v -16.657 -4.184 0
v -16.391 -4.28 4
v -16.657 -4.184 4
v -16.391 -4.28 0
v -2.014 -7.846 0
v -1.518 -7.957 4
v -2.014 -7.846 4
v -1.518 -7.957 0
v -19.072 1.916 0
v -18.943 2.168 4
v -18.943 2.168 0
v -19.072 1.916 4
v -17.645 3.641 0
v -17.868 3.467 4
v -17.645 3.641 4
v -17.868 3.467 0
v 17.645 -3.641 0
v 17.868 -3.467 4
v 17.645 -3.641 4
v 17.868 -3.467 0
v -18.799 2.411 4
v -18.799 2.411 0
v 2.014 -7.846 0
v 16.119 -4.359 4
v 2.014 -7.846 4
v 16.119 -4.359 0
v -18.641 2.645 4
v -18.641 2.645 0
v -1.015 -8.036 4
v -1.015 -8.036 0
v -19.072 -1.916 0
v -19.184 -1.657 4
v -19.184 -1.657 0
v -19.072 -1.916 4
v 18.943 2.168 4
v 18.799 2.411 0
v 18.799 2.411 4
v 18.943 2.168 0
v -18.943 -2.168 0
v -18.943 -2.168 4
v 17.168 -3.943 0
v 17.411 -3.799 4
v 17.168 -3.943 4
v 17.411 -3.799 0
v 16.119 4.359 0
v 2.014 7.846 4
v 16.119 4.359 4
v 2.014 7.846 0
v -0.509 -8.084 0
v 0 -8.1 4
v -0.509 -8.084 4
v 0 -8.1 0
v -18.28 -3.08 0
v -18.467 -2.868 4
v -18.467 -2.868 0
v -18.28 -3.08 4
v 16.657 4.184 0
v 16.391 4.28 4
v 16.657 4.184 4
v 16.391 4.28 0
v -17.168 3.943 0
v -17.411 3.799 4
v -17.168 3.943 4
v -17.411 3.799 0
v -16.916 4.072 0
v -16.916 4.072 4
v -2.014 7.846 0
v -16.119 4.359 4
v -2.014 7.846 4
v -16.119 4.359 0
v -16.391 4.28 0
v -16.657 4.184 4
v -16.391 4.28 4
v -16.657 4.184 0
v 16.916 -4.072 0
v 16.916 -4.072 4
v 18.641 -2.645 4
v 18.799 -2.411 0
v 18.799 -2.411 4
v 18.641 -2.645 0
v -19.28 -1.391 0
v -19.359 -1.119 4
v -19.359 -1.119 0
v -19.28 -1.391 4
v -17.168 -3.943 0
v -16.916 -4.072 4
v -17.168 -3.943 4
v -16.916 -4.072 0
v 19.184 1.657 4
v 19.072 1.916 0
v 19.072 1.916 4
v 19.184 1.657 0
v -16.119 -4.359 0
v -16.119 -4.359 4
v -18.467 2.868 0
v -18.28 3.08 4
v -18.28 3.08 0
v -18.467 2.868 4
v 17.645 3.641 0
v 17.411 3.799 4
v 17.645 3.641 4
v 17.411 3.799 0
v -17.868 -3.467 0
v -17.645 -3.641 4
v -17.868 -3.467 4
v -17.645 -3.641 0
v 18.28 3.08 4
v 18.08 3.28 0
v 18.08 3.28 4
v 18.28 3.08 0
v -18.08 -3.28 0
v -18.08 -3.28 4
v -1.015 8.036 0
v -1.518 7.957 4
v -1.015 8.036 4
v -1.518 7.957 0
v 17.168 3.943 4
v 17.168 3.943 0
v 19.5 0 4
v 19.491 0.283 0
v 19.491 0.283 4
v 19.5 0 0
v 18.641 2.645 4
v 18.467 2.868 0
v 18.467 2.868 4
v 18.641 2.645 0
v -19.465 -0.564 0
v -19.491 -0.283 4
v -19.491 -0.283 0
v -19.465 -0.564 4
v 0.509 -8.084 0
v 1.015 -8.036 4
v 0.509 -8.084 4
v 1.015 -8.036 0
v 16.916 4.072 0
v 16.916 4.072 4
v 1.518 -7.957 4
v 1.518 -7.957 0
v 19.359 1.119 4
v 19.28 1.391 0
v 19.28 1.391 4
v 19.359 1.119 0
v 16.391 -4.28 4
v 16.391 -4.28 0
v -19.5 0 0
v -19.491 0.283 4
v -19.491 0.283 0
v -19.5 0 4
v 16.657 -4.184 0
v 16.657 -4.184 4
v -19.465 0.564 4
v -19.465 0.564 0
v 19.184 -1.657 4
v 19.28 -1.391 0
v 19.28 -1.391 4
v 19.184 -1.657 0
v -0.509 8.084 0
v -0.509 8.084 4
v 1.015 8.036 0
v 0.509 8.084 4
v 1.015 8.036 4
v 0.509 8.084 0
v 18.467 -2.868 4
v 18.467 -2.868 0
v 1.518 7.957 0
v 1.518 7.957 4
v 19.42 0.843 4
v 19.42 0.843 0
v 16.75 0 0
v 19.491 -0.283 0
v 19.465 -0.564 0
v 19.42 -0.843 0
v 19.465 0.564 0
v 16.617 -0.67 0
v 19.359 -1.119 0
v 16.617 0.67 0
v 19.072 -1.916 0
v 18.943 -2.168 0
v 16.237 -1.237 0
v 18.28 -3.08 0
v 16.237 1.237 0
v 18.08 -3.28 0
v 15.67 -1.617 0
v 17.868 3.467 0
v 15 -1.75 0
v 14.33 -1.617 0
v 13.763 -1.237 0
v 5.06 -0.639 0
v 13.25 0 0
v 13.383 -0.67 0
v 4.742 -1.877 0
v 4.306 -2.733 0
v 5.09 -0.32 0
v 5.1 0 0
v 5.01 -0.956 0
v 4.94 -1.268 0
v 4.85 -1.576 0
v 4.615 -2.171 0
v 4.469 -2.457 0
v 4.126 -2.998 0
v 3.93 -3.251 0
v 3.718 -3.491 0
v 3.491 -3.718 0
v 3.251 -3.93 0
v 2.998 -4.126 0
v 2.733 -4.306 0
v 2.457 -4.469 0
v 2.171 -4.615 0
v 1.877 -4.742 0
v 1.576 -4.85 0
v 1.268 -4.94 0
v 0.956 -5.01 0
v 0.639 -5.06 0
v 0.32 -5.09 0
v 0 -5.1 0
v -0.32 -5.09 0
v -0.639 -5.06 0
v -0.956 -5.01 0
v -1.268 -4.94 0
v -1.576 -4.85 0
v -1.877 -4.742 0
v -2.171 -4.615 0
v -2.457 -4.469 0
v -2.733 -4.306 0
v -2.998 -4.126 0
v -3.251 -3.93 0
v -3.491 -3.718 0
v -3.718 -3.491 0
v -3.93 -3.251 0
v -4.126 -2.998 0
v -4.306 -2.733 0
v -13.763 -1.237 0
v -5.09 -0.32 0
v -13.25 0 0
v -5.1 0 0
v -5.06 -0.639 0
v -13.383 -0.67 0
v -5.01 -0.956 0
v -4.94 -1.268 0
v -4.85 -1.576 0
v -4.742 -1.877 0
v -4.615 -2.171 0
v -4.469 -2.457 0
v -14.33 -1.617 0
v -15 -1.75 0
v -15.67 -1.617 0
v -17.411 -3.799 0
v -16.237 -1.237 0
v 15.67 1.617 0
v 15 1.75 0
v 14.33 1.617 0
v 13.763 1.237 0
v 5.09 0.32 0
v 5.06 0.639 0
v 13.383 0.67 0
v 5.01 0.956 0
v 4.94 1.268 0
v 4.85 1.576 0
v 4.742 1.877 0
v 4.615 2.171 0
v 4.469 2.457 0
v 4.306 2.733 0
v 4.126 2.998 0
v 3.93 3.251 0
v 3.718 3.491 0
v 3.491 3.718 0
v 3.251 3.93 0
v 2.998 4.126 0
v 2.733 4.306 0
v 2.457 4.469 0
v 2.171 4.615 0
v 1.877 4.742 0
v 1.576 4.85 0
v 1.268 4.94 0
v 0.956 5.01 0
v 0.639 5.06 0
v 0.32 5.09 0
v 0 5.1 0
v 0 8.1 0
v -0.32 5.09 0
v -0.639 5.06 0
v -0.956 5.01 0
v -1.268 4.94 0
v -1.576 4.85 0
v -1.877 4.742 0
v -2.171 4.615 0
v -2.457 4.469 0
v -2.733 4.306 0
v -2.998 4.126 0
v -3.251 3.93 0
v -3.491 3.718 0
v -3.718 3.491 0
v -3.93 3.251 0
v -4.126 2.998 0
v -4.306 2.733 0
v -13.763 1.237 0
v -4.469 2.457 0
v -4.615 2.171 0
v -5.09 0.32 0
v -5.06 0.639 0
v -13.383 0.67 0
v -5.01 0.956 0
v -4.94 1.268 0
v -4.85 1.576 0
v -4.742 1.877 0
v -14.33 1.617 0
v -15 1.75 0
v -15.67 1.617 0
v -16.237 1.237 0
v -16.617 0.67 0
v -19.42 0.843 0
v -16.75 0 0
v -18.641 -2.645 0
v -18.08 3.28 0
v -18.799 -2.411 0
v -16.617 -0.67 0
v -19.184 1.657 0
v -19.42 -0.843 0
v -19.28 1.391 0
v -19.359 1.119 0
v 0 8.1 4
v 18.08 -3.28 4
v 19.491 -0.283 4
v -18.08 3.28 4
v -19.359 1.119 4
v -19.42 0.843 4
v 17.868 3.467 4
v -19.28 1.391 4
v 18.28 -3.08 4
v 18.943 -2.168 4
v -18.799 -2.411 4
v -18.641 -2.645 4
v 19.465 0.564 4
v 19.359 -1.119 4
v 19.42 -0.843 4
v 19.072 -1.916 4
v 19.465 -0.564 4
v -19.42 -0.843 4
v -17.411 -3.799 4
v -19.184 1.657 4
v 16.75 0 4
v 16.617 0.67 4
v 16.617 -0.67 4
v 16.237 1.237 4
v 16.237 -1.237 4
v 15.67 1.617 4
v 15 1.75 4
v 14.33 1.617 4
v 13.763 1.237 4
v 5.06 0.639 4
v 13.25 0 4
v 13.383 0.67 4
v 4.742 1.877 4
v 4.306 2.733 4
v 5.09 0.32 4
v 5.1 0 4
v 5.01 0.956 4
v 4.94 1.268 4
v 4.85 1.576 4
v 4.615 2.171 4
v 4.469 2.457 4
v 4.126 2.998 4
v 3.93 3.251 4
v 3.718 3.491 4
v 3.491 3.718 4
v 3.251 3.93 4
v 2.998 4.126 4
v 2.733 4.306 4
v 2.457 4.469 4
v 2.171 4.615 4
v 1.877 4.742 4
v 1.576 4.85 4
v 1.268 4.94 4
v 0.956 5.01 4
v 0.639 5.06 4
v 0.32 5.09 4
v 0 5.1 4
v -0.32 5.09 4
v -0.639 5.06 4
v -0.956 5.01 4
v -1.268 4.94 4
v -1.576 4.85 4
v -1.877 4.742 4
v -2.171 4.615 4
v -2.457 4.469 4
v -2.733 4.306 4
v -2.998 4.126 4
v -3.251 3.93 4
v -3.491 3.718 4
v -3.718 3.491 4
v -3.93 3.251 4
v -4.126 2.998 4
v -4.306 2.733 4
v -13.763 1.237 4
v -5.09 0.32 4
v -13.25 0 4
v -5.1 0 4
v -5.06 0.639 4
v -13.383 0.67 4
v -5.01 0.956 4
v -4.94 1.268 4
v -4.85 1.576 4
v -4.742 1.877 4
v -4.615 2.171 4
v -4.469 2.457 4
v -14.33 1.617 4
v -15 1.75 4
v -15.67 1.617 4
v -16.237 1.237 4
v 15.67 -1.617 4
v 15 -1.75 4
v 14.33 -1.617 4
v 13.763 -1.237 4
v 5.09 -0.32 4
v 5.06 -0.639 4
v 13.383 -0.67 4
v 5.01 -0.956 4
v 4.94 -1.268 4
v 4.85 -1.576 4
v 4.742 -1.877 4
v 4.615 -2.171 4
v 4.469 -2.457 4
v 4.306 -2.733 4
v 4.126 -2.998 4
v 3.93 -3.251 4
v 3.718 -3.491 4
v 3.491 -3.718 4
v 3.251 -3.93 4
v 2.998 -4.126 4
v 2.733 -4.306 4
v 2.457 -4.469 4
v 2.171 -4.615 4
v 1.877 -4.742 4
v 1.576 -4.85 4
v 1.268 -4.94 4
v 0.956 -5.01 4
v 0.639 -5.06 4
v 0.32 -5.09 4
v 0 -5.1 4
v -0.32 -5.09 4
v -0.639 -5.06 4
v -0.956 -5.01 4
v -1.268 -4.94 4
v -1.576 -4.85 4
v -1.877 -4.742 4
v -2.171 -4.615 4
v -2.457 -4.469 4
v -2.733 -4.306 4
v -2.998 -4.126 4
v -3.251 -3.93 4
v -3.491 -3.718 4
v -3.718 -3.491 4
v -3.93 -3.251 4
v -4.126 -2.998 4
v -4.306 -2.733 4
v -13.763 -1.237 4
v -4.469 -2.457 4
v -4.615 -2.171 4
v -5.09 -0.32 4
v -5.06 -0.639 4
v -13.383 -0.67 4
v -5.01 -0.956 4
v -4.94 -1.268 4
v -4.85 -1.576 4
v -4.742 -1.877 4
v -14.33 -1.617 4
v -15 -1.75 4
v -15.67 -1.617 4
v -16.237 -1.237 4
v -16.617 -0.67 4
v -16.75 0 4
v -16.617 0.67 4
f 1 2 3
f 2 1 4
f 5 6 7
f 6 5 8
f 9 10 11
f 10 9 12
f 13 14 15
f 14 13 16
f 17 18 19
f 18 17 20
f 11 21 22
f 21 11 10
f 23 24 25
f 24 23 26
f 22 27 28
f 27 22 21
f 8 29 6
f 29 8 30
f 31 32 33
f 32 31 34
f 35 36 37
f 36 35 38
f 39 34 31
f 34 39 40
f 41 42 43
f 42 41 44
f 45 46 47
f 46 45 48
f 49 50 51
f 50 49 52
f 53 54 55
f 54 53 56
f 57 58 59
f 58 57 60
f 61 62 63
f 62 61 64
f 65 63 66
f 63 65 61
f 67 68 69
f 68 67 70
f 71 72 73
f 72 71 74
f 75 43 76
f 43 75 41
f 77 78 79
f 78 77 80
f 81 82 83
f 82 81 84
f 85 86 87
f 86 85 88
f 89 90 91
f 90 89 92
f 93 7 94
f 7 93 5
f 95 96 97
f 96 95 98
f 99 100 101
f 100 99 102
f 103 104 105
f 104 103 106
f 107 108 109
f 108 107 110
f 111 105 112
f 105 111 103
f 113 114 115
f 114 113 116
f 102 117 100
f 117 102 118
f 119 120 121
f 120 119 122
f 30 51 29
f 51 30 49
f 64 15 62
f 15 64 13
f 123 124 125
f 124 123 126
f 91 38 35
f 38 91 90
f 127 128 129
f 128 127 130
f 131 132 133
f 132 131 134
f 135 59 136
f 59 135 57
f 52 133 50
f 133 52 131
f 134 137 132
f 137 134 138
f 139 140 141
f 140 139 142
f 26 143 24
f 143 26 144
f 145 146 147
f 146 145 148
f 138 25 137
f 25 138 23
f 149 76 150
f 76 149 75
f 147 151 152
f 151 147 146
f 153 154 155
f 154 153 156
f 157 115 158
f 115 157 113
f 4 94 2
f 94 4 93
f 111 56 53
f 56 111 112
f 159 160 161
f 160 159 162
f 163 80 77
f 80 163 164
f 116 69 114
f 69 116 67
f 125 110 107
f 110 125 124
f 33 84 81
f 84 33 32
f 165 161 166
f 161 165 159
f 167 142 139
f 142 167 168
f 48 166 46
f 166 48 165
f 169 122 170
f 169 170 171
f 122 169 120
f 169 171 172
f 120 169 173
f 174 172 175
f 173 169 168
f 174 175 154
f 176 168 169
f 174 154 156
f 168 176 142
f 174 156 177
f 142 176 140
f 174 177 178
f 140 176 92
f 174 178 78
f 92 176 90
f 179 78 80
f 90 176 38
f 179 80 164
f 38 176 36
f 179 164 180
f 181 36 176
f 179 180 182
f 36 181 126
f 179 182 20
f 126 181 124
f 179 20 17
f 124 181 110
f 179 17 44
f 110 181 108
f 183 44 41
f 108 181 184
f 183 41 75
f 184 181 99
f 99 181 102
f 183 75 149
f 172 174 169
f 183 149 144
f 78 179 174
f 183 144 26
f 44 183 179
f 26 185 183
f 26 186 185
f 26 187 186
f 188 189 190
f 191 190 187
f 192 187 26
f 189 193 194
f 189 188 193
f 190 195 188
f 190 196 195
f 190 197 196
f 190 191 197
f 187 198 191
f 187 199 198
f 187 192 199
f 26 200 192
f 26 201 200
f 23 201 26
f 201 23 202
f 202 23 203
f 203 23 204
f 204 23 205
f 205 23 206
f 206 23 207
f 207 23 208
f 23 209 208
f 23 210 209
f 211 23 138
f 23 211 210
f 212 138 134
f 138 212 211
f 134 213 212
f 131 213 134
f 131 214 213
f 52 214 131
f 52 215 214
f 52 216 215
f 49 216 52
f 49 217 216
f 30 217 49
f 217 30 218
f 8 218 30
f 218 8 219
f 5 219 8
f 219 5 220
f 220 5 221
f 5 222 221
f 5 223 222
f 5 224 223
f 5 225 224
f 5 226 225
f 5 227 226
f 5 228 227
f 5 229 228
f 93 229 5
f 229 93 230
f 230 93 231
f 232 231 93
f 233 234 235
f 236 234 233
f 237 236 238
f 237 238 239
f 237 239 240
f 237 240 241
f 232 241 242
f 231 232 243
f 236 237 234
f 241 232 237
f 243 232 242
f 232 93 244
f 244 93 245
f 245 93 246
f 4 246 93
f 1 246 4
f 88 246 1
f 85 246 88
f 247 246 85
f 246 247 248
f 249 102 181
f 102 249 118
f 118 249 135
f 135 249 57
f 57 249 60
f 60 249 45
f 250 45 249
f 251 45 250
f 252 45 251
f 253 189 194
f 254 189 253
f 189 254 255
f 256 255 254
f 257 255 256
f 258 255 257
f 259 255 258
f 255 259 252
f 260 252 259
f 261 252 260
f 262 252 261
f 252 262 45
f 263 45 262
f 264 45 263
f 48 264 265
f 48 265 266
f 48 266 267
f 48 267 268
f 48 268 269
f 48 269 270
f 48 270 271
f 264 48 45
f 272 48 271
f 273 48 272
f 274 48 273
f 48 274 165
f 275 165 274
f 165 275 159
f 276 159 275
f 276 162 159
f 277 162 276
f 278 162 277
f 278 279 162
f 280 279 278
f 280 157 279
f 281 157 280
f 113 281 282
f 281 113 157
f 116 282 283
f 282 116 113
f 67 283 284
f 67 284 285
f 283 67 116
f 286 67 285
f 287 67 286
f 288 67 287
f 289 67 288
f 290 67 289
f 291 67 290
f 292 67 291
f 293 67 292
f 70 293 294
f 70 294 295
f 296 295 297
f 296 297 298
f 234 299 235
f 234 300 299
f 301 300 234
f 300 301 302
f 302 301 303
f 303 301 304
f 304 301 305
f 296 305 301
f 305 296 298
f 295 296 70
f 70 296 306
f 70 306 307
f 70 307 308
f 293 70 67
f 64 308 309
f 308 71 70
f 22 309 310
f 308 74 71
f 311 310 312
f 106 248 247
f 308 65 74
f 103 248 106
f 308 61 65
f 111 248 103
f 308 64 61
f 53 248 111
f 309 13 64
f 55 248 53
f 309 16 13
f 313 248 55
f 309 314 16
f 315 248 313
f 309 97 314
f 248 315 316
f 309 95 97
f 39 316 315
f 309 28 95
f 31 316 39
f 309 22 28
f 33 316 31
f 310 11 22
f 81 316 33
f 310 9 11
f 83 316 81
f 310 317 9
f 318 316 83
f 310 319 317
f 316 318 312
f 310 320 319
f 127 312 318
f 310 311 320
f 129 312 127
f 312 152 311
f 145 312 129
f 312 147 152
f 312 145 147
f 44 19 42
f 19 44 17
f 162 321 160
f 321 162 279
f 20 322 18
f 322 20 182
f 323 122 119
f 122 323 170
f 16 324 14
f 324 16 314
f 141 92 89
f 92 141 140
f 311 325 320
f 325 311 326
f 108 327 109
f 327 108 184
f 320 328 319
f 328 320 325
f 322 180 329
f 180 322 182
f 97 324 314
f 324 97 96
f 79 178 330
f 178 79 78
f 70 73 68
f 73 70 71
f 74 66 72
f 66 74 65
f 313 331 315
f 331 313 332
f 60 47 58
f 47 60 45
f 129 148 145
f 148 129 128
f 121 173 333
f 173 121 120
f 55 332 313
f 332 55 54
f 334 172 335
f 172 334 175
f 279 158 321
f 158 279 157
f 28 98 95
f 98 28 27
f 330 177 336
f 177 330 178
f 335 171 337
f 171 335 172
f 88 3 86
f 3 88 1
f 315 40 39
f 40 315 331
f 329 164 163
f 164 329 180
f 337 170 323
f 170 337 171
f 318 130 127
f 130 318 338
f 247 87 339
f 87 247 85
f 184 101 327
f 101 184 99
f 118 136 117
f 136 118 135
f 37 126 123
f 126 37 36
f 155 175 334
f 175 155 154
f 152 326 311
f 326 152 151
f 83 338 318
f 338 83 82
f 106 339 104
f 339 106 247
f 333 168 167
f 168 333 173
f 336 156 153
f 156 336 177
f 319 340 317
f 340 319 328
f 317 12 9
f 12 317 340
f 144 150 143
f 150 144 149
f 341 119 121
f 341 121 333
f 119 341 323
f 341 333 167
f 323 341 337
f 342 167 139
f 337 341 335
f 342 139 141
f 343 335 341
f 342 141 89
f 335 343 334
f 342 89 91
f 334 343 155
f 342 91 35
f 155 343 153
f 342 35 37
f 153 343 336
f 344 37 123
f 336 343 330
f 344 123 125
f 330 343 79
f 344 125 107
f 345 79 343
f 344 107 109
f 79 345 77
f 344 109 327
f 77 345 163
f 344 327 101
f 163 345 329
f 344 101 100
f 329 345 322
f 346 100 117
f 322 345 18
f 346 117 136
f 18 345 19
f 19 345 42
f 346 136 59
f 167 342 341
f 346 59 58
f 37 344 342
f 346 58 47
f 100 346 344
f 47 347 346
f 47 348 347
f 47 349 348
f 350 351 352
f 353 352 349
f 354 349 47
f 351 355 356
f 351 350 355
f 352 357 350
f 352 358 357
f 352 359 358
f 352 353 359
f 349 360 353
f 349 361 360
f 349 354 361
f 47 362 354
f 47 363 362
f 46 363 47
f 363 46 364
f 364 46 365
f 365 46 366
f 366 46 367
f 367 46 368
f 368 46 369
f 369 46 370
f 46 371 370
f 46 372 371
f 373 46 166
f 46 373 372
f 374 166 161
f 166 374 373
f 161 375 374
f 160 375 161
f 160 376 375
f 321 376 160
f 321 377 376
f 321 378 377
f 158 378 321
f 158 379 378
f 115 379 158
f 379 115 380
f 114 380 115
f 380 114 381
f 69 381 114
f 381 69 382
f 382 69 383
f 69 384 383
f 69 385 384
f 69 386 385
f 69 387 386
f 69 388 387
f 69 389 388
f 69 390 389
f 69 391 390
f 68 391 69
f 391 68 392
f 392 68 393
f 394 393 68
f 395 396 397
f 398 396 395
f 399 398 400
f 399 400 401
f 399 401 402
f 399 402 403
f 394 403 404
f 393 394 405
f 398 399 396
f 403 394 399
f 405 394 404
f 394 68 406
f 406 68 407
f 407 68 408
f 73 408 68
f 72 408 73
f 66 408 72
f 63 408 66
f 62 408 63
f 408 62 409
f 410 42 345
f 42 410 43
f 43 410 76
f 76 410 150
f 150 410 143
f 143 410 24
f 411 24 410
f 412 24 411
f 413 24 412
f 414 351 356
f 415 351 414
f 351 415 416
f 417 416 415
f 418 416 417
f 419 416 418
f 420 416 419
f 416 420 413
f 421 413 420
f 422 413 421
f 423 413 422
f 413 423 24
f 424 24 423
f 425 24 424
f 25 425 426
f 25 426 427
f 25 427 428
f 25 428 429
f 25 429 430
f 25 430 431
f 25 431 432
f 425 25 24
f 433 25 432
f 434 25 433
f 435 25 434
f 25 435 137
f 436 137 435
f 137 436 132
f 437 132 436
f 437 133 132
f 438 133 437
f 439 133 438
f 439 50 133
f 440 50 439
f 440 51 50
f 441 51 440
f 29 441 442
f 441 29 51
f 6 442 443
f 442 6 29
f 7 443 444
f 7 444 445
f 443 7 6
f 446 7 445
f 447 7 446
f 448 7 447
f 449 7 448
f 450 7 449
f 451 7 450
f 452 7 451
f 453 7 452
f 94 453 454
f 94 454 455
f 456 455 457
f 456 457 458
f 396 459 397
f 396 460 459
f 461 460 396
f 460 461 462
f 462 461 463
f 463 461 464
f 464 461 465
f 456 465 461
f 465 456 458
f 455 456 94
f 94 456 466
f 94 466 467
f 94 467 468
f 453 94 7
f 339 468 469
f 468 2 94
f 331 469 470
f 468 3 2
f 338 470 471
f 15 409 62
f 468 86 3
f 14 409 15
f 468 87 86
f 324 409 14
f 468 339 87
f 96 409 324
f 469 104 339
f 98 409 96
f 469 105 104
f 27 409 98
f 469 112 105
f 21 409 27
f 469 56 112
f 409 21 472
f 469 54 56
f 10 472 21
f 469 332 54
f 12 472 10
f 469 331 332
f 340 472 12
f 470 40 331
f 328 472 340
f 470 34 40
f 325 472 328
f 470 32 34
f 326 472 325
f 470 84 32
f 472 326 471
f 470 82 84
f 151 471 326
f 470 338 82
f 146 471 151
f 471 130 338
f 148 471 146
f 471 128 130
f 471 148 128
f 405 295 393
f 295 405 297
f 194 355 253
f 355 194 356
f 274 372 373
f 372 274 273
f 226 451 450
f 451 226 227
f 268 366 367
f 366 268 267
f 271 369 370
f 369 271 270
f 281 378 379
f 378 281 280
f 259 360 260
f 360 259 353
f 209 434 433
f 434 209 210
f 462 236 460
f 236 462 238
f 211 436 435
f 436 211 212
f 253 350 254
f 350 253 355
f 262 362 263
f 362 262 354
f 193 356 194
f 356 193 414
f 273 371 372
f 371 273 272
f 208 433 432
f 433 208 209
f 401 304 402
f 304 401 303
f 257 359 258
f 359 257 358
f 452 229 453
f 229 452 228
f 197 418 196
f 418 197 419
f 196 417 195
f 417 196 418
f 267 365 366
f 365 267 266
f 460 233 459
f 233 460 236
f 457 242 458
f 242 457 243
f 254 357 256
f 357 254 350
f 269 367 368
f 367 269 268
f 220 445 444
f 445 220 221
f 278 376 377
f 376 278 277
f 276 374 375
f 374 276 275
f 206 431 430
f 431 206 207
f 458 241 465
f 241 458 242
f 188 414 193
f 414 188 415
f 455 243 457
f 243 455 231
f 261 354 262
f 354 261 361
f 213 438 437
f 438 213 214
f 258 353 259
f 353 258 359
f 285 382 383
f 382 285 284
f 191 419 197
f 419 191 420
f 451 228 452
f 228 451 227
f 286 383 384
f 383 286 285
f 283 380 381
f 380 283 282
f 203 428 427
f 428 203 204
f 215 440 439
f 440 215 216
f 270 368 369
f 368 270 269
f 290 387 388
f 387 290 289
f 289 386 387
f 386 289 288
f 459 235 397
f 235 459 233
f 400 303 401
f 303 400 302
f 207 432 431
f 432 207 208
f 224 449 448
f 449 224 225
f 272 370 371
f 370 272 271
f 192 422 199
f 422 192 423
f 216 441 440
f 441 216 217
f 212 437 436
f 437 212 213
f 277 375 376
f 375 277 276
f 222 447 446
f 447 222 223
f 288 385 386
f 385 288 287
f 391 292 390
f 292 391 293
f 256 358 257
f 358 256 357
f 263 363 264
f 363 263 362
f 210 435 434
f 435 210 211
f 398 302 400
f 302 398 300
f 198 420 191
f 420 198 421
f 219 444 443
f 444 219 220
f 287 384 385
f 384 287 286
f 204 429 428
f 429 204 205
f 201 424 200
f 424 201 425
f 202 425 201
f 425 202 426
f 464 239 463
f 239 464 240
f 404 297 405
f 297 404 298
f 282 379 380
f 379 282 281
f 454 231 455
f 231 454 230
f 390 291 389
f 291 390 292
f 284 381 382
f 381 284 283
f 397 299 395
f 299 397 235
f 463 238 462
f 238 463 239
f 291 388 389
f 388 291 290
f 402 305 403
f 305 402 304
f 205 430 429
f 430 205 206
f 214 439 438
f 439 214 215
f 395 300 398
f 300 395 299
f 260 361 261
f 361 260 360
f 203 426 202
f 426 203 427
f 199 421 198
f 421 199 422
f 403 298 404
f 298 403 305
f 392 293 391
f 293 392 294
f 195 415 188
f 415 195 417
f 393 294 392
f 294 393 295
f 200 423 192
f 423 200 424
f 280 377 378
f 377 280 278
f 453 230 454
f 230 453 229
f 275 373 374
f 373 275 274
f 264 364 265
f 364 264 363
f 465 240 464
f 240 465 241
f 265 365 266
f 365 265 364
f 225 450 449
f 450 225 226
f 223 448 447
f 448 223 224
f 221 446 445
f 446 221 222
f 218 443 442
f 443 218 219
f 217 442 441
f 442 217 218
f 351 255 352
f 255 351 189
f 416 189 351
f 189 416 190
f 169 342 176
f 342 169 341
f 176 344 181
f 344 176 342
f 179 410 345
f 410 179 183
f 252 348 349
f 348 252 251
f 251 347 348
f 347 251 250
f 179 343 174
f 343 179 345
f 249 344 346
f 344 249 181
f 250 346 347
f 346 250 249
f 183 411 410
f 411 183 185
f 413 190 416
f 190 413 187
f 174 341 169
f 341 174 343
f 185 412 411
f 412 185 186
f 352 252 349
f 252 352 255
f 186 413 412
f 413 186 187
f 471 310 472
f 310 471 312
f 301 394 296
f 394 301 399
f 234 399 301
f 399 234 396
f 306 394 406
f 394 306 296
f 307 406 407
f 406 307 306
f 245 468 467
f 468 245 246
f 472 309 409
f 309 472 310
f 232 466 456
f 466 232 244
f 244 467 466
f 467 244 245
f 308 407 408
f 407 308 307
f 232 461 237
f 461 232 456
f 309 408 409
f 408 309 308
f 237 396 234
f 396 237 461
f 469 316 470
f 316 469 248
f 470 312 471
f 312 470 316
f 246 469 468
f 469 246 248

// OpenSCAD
// file: config.scad
r4 = 2.2;
r8 = 4.2;
r10 = 5.2;

layer_height = 0.25;

switch_d = 9.6;

nema17_r_vis = 15.5;
nema17_r_centre = 11.5;
nema17_h_centre = 2;
nema17_h = 43;
nema17_l = 40;

boite_ui_largeur = 28.5;
boite_ui_l = 46;

support_laser = 24;

r3 = 1.75;
r3_2d = 1.5;
r3_vis = 1.65;
r3_head = 3.6;
m3_r = r3;
m3_nut_d = 7;
m3_nut_d2 = 6.2;
m3_nut_h = 3;

m4_nut_d = 8;
m4_nut_d2 = 7;
m4_nut_h = 4;

608_r = 23/2;
608_h = 8;

laser_printer_l = 609;
laser_printer_lg = 456;

module support_nut(d=3, l_screw1 = 20, l_screw2 = 20, l_nut = 20, h_screw2 = -0.1){
    if(d==3){
        screw_r = r3;
        nut_r = m3_nut_d/2;
        nut_h = m3_nut_h;
        cylinder(nut_h, r = nut_r, $fn = 6, center = true);
        translate([0, 0, -l_screw1])cylinder(l_screw1 +1, r = screw_r);
        translate([0, 0, m3_nut_h/2+ h_screw2])cylinder(l_screw2, r = screw_r);
        l = m3_nut_d*cos(30);
        translate([0, -l/2, -nut_h/2]) cube([l_nut, l,nut_h]);
    } else if(d==4){
        screw_r = r4;
        nut_r = m4_nut_d/2;
        nut_h = m4_nut_h;
        cylinder(nut_h, r = nut_r, $fn = 6, center = true);
        translate([0, 0, -l_screw1])cylinder(l_screw1 +1, r = screw_r);
        translate([0, 0, m4_nut_h/2+ h_screw2])cylinder(l_screw2, r = screw_r);
        l = m4_nut_d*cos(30);
        translate([0, -l/2, -nut_h/2]) cube([l_nut, l,nut_h]);
    }
}


module nut(d=3, center = false){
    nut_r = m3_nut_d/2;
    nut_h = m3_nut_h;
    if(d==3){
        nut_r = m3_nut_d/2;
        nut_h = m3_nut_h;
    } 
    cylinder(nut_h, r = nut_r, $fn = 6, center = center);
}



module m3(h, nut = false, head = false){
    cylinder(h, m3_r, m3_r, $fn=16);
    if(nut){
        cylinder(m3_nut_h, r = m3_nut_d/2, $fn = 6);
    }
}

module m3_nut(h){
    cylinder(m3_nut_h, r = m3_nut_d/2, $fn = 6);
    translate([0, -m3_nut_d2/2, 0]) cube([h, m3_nut_d2, m3_nut_h]);
}

m4_r = 2.3;
m4_nut_d = 8.4;
m4_nut_d2 = 7.5;
m4_nut_h = 3.5;
module m4(h, nut = false, head = false){
    cylinder(h, m4_r, m4_r);
    if(nut){
        cylinder(m4_nut_h, r = m4_nut_d/2, $fn = 6);
    }
}

module m5(h, nut = false, head = false){
    cylinder(h, r = 2.7);
}

m8_nut_d = 15;
m8_nut_d2 = 13;
m8_nut_h = 6.5;
module m8(h, nut = false, head = false){
    cylinder(h, r = r8);
    if(nut){
        cylinder(m8_nut_h, r = m8_nut_d/2, $fn = 6);
    }
}

module cube_arrondi(x, y, z, r=2){
    hull(){
        translate([(x/2-r), (y/2-r), 0]) cylinder(z,r=r);
        translate([(x/2-r), -(y/2-r), 0]) cylinder(z,r=r);
        translate([-(x/2-r), (y/2-r), 0]) cylinder(z,r=r);
        translate([-(x/2-r), -(y/2-r), 0]) cylinder(z,r=r);
    }
}

module demi_glissiere(r, l, h){
    cylinder(h, r, r);
    translate([-r, 0, 0]) cube([r*2, l, h]);
}


module nema17_2d(){
    nema17_l = 43;
    nema17_h = 6;
    polygon([[0,nema17_h], [nema17_h,0]
            , [nema17_l-nema17_h,0],[nema17_l,nema17_h]
            , [nema17_l,nema17_l-nema17_h],[nema17_l-nema17_h,nema17_l]
            , [8,nema17_l],[0,nema17_l-nema17_h] ]);
}

module nema17_2d2(){
    translate([nema17_r_vis, nema17_r_vis] ) circle(r3_2d);
    translate([nema17_r_vis, -nema17_r_vis] ) circle(r3_2d);
    translate([-nema17_r_vis, nema17_r_vis] ) circle(r3_2d);
    translate([-nema17_r_vis, -nema17_r_vis] ) circle(r3_2d);
    circle(nema17_r_centre);
}


module nema17(){
    translate([-nema17_h/2, -nema17_h/2, -nema17_l/2] ) linear_extrude(nema17_l) nema17_2d();
    
    h = nema17_h/2+6;
    translate([nema17_r_vis, nema17_r_vis, 0] )rotate([0, 0, 0]) cylinder(h, r = r3);
    translate([nema17_r_vis, -nema17_r_vis, 0] )rotate([0, 0, 0]) cylinder(h, r = r3);
    translate([-nema17_r_vis, nema17_r_vis, 0] )rotate([0, 0, 0]) cylinder(h, r = r3);
    translate([-nema17_r_vis, -nema17_r_vis, 0] )rotate([0, 0, 0]) cylinder(h, r = r3);
    cylinder(h, nema17_r_centre, nema17_r_centre);
    cylinder(h+14, r = 8);
    
    translate([-8.5, 0, -nema17_l/2] ) cube([17,30, 10]);
}

module corner(l_corner, h_corner, lg_corner){
    translate([0, lg_corner, 0]) rotate([90, 0, 0]) linear_extrude(lg_corner) polygon([[0,0], [l_corner, 0], [0, h_corner]]);
}


/**
 * 2D
 **/

module m3_2d(){
    circle(r3_2d);
}


module cran_x(_l, e, cran, inv){
    difference(){
        square([_l, e]);
        if(inv){
            for(i=[-round(_l/cran):round(_l/cran)]){
                translate([_l/2 + cran/2 - 2*i*cran, -1]) square([cran, e+2]);
            }
        }else{
            for(i=[-round(_l/cran):round(_l/cran)]){
                translate([_l/2 - cran/2 - 2*i*cran, -1]) square([cran, e+2]);
            }
        }
    }
}

module cran_y(_l, e, cran, inv){
    translate([e, 0]) rotate([0, 0, 90]) cran_x(_l, e, cran, inv); 
}

module whole_2d(type_vis){
    if(type_vis == 3){
        circle(1.5);
    } else if(type_vis == 4){
        circle(2);
    } else {
        echo("whole_2d " + type_vis);
    }
}

module nuts_2d(type_vis){
    if(type_vis == 3){
        translate([-1.5, 0])square([3, 20]);
        translate([-5.5/2, 10])square([5.5, 2.5]);
    } else if(type_vis == 4){
        translate([-2, 0])square([4, 30]);
        translate([-7/2, 20])square([7, 3.5]);
    } else {
        echo("nuts_2d " + type_vis);
    }
}

module cran_x_vis(_l, e, cran, type_vis = 3, trous = [0.1, 0.5, 0.9]){
    difference(){
        square([_l, e]);
        for(i=[-round(_l/cran):round(_l/cran)]){
                translate([_l/2 - cran/2 - 2*i*cran, -1]) square([cran, e+2]);
            }
        
    }
    for(i = trous){
        j = round((i-0.5)*_l/(2*cran));
        translate([_l/2  - 2*j*cran, e/2]) whole_2d(type_vis);
    }
}

module cran_x_nuts(_l, e, cran, type_vis = 3, trous = [0.1, 0.5, 0.9]){
    difference(){
        square([_l, e]);
        for(i=[-round(_l/cran):round(_l/cran)]){
                translate([_l/2 + cran/2 - 2*i*cran, -1]) square([cran, e+2]);
        }
    }
    for(i = trous){
        j = round((i-0.5)*_l/(2*cran));
        translate([_l/2  - 2*j*cran, e/2]) nuts_2d(type_vis);
    }
}

module cran_y_vis(_l, e, cran, type_vis = 3, trous = [0.1, 0.5, 0.9]){
    translate([e, 0]) rotate([0, 0, 90]) cran_x_vis(_l, e, cran, type_vis, trous);
}

module cran_y_nuts(_l, e, cran, type_vis = 3, trous = [0.1, 0.5, 0.9]){
    translate([0, _l]) rotate([0, 0, -90]) cran_x_nuts(_l, e, cran, type_vis, trous);
}
// main file
include <config.scad>;

$fn = 100;
ecartement = 30;
r_tige = 5.1;
r_vis = 1.5;
e = 4;
e2 = 3;

module palier(){
    difference(){
        hull(){
            cylinder(e, r = r_tige + e2);
            translate([ecartement/2,0,0])cylinder(e, r = r_vis + e2);
            translate([-ecartement/2,0,0])cylinder(e, r = r_vis + e2);
            
        }
        translate([0,0,-1]) cylinder(e+2, r = r_tige);
        translate([ecartement/2,0,-1])m3(e+2);
        translate([-ecartement/2,0,-1])m3(e+2);
            
    }
}

module palier_roulement_608(){
    h = 608_h+e;
    difference(){
        hull(){
            cylinder(h, r = 608_r + e2);
            translate([ecartement/2,0,0])cylinder(h, r = r_vis + e2);
            translate([-ecartement/2,0,0])cylinder(h, r = r_vis + e2);
            
        }
        translate([0,0,-1]) cylinder(h+2, r = 5);
        translate([0,0,e]) cylinder(h+2, r = 608_r);
        translate([ecartement/2,0,-1])m3(h+2);
        translate([-ecartement/2,0,-1])m3(h+2);
            
    }
}

module palier_bas(){
    h =9;
    difference(){
        union(){
            hull(){
                cylinder(e, r = r_tige + e2);
                translate([ecartement/2,0,0])cylinder(e, r = r_vis + e2);
                translate([-ecartement/2,0,0])cylinder(e, r = r_vis + e2);
            }
            cylinder(h+2, r = r_tige + e2);
        }
        translate([0,0,-1]) cylinder(h+1, r = r_tige);
        translate([ecartement/2,0,-1])m3(e+2);
        translate([-ecartement/2,0,-1])m3(e+2);
            
    }
}

translate([0,0,0]) palier();
